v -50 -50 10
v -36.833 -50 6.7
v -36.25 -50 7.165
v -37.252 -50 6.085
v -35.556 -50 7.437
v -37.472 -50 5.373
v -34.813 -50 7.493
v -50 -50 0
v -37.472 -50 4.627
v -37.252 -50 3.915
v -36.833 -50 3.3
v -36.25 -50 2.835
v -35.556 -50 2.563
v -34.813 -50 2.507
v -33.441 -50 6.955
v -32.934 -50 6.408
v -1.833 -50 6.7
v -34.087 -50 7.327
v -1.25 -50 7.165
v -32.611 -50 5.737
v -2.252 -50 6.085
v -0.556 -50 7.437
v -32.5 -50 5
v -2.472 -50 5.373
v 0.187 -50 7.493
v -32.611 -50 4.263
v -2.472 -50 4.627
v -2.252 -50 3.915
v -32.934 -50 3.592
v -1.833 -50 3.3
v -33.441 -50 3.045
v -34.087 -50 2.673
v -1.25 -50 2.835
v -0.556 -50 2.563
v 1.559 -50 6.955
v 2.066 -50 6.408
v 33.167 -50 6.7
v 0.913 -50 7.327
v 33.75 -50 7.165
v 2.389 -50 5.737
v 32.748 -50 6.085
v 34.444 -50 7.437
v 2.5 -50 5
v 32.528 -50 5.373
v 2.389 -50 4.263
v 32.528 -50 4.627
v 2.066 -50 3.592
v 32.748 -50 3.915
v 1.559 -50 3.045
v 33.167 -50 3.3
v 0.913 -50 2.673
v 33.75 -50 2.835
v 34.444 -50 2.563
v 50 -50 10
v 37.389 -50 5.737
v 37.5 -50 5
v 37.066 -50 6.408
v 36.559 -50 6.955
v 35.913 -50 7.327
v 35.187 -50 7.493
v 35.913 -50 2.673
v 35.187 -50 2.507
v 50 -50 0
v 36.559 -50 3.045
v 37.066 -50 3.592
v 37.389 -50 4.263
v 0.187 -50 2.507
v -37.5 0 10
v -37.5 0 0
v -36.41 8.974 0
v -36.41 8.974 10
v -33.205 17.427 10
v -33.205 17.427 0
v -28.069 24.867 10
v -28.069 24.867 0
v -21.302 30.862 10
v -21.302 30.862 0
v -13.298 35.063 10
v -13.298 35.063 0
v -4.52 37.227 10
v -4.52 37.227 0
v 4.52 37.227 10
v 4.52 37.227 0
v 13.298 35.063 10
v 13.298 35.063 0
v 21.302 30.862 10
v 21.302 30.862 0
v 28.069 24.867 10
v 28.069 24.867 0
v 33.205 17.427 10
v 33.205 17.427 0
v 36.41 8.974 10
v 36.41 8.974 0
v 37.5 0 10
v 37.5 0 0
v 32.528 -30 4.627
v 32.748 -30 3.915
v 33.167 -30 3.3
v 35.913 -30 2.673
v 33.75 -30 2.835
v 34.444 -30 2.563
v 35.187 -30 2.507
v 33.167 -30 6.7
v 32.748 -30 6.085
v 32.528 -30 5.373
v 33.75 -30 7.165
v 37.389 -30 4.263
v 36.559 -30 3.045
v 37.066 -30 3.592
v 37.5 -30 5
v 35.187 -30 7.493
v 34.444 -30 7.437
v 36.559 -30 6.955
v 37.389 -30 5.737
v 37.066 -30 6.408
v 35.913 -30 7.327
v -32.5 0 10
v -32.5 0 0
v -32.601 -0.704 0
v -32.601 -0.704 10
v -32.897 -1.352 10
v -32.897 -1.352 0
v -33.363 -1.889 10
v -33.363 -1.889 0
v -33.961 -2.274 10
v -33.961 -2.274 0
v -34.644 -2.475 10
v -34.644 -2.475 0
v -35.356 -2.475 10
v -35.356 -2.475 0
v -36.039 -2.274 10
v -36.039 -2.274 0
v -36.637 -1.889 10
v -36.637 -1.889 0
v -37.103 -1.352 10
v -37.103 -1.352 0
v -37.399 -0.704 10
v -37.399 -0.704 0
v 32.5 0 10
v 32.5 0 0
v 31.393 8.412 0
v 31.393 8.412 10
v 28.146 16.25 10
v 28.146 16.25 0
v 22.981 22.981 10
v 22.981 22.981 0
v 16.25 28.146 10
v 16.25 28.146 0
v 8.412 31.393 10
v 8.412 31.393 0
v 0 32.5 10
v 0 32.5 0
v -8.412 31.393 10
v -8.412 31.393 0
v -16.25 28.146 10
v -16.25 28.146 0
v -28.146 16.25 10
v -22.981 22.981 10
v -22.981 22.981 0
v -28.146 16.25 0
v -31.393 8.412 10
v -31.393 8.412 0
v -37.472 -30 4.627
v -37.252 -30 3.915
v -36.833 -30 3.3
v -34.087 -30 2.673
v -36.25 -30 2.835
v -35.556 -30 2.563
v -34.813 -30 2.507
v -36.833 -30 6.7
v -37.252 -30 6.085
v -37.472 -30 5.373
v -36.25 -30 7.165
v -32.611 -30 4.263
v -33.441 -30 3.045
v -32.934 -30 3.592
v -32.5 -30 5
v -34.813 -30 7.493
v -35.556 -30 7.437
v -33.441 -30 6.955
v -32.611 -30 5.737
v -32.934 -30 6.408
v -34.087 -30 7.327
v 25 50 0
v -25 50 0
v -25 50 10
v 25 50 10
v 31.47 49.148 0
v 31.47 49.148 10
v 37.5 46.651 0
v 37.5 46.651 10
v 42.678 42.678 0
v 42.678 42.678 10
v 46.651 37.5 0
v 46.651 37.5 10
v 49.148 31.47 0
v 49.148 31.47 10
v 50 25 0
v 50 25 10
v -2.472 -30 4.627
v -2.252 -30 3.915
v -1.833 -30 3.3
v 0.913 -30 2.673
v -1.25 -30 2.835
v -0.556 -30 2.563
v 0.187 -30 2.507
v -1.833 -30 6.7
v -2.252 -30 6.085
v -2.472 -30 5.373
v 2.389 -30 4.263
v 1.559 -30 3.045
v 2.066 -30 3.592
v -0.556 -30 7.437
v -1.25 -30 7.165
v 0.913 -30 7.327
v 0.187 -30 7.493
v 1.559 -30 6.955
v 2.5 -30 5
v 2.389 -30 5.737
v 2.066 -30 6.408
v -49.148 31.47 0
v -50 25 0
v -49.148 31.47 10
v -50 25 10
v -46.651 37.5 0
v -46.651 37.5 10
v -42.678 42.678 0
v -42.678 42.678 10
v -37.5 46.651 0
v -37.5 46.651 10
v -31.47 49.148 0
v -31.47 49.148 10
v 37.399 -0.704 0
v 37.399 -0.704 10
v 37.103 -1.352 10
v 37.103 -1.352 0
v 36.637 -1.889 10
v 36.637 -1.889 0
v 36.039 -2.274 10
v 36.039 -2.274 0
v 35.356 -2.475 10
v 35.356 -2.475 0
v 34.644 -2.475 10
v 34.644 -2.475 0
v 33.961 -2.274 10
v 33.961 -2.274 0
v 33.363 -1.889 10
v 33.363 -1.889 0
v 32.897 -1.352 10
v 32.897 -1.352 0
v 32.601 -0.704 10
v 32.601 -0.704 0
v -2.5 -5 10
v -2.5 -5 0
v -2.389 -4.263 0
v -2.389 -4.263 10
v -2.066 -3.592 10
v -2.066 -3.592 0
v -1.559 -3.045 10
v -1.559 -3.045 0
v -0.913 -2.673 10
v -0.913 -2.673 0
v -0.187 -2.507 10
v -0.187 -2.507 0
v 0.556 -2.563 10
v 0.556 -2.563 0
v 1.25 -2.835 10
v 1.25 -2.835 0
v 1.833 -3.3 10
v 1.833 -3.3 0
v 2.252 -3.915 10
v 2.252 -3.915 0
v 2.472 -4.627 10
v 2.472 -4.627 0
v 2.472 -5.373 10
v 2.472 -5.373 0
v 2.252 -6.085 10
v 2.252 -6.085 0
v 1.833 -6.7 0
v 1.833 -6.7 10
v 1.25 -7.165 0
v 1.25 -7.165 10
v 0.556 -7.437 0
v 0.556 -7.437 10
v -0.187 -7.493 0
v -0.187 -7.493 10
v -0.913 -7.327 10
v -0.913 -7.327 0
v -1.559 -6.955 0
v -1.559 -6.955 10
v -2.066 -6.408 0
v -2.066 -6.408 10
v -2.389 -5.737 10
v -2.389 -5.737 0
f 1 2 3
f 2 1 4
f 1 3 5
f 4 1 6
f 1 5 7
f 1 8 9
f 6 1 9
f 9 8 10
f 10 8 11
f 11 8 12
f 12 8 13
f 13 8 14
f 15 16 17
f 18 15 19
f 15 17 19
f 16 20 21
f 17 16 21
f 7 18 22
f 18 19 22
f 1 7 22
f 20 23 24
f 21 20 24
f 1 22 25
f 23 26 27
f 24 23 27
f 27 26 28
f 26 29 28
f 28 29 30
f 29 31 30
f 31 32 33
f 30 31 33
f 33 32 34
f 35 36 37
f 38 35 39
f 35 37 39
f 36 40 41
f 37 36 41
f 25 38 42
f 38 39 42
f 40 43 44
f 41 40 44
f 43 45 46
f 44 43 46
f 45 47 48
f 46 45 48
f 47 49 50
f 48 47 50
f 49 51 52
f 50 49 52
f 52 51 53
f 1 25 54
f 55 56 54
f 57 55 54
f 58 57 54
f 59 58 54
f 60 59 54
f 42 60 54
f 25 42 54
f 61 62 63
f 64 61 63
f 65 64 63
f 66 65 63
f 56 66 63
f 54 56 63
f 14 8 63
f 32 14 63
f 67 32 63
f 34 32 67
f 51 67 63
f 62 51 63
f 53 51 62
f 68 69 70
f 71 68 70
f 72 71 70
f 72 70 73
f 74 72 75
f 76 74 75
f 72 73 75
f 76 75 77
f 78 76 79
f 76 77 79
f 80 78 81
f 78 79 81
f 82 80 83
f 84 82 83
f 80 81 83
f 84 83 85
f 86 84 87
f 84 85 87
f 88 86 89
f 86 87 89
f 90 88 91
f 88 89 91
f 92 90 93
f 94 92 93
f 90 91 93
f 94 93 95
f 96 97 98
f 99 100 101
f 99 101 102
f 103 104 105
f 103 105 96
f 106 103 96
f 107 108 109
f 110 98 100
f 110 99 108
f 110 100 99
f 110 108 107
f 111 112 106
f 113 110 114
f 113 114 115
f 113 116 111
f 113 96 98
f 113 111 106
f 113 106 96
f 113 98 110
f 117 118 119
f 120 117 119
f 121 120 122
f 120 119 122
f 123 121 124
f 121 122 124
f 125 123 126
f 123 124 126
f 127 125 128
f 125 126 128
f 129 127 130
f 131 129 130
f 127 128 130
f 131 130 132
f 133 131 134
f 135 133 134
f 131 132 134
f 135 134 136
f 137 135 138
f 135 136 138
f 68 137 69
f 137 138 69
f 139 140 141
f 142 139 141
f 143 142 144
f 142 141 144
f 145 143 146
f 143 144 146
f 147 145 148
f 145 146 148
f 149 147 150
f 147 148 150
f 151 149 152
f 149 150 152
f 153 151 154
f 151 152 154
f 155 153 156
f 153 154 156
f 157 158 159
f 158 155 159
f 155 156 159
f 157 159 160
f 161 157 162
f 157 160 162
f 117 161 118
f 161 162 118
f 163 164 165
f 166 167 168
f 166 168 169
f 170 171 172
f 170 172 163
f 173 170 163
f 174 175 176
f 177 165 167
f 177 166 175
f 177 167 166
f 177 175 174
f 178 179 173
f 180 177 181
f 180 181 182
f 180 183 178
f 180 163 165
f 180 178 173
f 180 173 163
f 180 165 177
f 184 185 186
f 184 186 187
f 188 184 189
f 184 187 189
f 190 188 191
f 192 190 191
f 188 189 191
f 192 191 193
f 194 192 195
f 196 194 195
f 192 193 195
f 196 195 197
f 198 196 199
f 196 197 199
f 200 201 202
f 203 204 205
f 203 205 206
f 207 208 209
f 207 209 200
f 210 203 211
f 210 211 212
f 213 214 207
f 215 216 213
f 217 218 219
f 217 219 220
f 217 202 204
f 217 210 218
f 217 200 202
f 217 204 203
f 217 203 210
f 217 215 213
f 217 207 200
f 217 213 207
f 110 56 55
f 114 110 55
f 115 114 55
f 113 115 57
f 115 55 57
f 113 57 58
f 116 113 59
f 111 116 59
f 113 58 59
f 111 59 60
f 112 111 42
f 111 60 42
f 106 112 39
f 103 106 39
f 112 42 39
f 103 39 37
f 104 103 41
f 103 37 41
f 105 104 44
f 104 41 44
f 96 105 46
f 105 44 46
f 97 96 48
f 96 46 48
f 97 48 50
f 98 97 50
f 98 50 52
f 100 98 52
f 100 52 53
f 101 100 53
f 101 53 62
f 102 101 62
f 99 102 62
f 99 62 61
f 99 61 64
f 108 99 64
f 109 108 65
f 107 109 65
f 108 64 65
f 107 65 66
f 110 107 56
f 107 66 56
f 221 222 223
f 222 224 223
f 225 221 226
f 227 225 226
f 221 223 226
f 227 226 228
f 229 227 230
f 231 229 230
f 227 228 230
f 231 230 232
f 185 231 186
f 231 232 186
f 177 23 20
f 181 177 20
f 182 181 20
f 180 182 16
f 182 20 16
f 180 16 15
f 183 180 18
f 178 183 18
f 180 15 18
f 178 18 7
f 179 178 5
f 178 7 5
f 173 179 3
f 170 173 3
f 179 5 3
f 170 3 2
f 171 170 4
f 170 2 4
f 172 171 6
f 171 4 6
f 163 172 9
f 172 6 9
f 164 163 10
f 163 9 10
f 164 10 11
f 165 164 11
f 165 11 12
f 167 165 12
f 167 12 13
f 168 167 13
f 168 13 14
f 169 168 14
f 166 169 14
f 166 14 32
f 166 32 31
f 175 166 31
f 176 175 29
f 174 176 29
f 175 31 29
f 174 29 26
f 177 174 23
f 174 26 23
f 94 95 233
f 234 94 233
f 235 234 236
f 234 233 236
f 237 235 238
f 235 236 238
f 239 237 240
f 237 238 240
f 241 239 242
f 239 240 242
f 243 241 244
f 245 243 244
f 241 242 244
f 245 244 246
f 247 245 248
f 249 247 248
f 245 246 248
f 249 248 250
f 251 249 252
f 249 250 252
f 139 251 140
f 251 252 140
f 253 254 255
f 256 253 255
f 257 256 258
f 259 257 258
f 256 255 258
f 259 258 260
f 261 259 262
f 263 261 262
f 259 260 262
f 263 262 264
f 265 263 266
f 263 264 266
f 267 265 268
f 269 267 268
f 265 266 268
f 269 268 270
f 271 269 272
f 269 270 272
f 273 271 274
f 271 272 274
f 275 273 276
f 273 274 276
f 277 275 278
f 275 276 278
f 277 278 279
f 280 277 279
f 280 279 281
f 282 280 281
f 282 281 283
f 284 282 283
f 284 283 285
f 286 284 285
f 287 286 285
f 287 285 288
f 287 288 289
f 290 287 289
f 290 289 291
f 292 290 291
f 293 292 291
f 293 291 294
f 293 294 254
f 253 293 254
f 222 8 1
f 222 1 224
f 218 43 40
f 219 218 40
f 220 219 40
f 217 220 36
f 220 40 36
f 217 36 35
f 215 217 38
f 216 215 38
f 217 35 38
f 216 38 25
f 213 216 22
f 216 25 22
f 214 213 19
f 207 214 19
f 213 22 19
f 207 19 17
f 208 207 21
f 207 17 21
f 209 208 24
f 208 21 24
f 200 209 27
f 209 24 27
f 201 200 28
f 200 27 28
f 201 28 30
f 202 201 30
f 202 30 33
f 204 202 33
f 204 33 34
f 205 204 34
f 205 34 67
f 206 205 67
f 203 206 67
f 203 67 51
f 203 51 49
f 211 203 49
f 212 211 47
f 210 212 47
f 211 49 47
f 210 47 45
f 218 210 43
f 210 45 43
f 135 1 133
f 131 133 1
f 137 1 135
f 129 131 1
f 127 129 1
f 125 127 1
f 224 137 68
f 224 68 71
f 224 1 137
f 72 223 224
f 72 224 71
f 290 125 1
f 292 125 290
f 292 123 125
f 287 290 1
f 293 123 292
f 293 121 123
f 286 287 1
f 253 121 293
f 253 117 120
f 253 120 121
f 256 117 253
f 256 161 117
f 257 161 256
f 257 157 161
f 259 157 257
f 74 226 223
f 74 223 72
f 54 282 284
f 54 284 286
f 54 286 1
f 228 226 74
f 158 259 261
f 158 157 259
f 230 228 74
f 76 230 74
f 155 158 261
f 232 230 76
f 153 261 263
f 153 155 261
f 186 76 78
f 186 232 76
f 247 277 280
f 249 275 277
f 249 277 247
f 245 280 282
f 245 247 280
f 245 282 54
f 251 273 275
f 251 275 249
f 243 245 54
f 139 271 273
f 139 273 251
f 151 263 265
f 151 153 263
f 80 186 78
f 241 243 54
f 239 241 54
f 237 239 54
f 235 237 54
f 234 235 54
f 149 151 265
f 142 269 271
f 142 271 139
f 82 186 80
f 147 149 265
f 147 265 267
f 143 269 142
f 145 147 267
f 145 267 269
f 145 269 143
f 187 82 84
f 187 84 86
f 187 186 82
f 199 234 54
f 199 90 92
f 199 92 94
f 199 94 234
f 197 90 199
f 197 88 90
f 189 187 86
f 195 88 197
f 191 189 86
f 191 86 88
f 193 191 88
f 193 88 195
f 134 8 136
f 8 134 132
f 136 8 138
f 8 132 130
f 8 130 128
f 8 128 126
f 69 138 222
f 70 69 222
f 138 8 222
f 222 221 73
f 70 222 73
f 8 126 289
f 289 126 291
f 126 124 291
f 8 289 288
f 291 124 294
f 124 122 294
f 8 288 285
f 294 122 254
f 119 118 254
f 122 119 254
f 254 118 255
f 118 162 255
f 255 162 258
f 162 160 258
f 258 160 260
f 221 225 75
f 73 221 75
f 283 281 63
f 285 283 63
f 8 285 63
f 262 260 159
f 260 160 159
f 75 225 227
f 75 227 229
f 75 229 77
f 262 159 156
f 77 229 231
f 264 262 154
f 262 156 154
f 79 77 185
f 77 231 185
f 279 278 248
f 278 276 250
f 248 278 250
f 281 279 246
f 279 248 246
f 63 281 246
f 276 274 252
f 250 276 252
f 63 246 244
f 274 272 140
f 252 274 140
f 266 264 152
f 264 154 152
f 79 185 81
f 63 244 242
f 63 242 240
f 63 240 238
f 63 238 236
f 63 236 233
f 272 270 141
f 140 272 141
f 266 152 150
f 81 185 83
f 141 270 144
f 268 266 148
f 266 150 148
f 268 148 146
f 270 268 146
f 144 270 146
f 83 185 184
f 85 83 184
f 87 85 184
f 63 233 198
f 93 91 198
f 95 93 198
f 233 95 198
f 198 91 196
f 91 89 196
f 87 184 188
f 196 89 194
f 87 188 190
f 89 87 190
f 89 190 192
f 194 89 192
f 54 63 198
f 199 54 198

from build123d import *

# Parameters (mm, degrees)
SKETCH1_W           = 100
SKETCH1_H           = 100
BOSS_EXTRUDE1_DEPTH = 10
CUT_EXTRUDE1_REACH  = 73.414
SKETCH2_R           = 2.5
SKETCH3_R           = 2.5
CUT_EXTRUDE2_DEPTH  = 20
FILLET2_R           = 25
FILLET3_R           = 25


with BuildPart() as part:
    # Sketch1 → Boss-Extrude1 (new body)
    with BuildSketch(Plane.XY):
        Rectangle(SKETCH1_W, SKETCH1_H)
    extrude(amount=BOSS_EXTRUDE1_DEPTH)

    # Sketch2 → Cut-Extrude1 (cut, up to next)
    with BuildSketch(Plane(origin=(0, 0, 0), x_dir=(-1, 0, 0), z_dir=(0, 0, -1)), mode=Mode.PRIVATE) as cut_extrude1_sk1:
        with Locations((0, -5)):
            Circle(SKETCH2_R)
    cut_extrude1_tool1 = extrude(cut_extrude1_sk1.sketch, amount=-CUT_EXTRUDE1_REACH, mode=Mode.PRIVATE) & part.part
    # Sketch2 → Cut-Extrude1 (cut, up to next)
    with BuildSketch(Plane(origin=(0, 0, 0), x_dir=(-1, 0, 0), z_dir=(0, 0, -1)), mode=Mode.PRIVATE) as cut_extrude1_sk2:
        with BuildLine():
            ThreePointArc((37.5, 0), (0, 37.5), (-37.5, 0))
            ThreePointArc((-37.5, 0), (-35, -2.5), (-32.5, 0))
            ThreePointArc((-32.5, 0), (0, 32.5), (32.5, 0))
            ThreePointArc((32.5, 0), (35, -2.5), (37.5, 0))
        make_face()
    cut_extrude1_tool2 = extrude(cut_extrude1_sk2.sketch, amount=-CUT_EXTRUDE1_REACH, mode=Mode.PRIVATE) & part.part
    add(cut_extrude1_tool1.solids().sort_by_distance((0, -5, 0))[0], mode=Mode.SUBTRACT)
    add(cut_extrude1_tool2.solids().sort_by_distance((0, 33.35, 0))[0], mode=Mode.SUBTRACT)

    # Sketch3 → Cut-Extrude2 (cut)
    with BuildSketch(Plane.XZ.offset(50)):
        with Locations((-35, 5)):
            Circle(SKETCH3_R)
        with Locations((0, 5)):
            Circle(SKETCH3_R)
        with Locations((35, 5)):
            Circle(SKETCH3_R)
    extrude(amount=-CUT_EXTRUDE2_DEPTH, mode=Mode.SUBTRACT)

    # Fillet2
    fillet2_edges = [part.edges().sort_by_distance(p)[0] for p in [
        (-50, 50, 5),
    ]]
    fillet(fillet2_edges, radius=FILLET2_R)

    # Fillet3
    fillet3_edges = [part.edges().sort_by_distance(p)[0] for p in [
        (50, 50, 5),
    ]]
    fillet(fillet3_edges, radius=FILLET3_R)


solid = part.part
